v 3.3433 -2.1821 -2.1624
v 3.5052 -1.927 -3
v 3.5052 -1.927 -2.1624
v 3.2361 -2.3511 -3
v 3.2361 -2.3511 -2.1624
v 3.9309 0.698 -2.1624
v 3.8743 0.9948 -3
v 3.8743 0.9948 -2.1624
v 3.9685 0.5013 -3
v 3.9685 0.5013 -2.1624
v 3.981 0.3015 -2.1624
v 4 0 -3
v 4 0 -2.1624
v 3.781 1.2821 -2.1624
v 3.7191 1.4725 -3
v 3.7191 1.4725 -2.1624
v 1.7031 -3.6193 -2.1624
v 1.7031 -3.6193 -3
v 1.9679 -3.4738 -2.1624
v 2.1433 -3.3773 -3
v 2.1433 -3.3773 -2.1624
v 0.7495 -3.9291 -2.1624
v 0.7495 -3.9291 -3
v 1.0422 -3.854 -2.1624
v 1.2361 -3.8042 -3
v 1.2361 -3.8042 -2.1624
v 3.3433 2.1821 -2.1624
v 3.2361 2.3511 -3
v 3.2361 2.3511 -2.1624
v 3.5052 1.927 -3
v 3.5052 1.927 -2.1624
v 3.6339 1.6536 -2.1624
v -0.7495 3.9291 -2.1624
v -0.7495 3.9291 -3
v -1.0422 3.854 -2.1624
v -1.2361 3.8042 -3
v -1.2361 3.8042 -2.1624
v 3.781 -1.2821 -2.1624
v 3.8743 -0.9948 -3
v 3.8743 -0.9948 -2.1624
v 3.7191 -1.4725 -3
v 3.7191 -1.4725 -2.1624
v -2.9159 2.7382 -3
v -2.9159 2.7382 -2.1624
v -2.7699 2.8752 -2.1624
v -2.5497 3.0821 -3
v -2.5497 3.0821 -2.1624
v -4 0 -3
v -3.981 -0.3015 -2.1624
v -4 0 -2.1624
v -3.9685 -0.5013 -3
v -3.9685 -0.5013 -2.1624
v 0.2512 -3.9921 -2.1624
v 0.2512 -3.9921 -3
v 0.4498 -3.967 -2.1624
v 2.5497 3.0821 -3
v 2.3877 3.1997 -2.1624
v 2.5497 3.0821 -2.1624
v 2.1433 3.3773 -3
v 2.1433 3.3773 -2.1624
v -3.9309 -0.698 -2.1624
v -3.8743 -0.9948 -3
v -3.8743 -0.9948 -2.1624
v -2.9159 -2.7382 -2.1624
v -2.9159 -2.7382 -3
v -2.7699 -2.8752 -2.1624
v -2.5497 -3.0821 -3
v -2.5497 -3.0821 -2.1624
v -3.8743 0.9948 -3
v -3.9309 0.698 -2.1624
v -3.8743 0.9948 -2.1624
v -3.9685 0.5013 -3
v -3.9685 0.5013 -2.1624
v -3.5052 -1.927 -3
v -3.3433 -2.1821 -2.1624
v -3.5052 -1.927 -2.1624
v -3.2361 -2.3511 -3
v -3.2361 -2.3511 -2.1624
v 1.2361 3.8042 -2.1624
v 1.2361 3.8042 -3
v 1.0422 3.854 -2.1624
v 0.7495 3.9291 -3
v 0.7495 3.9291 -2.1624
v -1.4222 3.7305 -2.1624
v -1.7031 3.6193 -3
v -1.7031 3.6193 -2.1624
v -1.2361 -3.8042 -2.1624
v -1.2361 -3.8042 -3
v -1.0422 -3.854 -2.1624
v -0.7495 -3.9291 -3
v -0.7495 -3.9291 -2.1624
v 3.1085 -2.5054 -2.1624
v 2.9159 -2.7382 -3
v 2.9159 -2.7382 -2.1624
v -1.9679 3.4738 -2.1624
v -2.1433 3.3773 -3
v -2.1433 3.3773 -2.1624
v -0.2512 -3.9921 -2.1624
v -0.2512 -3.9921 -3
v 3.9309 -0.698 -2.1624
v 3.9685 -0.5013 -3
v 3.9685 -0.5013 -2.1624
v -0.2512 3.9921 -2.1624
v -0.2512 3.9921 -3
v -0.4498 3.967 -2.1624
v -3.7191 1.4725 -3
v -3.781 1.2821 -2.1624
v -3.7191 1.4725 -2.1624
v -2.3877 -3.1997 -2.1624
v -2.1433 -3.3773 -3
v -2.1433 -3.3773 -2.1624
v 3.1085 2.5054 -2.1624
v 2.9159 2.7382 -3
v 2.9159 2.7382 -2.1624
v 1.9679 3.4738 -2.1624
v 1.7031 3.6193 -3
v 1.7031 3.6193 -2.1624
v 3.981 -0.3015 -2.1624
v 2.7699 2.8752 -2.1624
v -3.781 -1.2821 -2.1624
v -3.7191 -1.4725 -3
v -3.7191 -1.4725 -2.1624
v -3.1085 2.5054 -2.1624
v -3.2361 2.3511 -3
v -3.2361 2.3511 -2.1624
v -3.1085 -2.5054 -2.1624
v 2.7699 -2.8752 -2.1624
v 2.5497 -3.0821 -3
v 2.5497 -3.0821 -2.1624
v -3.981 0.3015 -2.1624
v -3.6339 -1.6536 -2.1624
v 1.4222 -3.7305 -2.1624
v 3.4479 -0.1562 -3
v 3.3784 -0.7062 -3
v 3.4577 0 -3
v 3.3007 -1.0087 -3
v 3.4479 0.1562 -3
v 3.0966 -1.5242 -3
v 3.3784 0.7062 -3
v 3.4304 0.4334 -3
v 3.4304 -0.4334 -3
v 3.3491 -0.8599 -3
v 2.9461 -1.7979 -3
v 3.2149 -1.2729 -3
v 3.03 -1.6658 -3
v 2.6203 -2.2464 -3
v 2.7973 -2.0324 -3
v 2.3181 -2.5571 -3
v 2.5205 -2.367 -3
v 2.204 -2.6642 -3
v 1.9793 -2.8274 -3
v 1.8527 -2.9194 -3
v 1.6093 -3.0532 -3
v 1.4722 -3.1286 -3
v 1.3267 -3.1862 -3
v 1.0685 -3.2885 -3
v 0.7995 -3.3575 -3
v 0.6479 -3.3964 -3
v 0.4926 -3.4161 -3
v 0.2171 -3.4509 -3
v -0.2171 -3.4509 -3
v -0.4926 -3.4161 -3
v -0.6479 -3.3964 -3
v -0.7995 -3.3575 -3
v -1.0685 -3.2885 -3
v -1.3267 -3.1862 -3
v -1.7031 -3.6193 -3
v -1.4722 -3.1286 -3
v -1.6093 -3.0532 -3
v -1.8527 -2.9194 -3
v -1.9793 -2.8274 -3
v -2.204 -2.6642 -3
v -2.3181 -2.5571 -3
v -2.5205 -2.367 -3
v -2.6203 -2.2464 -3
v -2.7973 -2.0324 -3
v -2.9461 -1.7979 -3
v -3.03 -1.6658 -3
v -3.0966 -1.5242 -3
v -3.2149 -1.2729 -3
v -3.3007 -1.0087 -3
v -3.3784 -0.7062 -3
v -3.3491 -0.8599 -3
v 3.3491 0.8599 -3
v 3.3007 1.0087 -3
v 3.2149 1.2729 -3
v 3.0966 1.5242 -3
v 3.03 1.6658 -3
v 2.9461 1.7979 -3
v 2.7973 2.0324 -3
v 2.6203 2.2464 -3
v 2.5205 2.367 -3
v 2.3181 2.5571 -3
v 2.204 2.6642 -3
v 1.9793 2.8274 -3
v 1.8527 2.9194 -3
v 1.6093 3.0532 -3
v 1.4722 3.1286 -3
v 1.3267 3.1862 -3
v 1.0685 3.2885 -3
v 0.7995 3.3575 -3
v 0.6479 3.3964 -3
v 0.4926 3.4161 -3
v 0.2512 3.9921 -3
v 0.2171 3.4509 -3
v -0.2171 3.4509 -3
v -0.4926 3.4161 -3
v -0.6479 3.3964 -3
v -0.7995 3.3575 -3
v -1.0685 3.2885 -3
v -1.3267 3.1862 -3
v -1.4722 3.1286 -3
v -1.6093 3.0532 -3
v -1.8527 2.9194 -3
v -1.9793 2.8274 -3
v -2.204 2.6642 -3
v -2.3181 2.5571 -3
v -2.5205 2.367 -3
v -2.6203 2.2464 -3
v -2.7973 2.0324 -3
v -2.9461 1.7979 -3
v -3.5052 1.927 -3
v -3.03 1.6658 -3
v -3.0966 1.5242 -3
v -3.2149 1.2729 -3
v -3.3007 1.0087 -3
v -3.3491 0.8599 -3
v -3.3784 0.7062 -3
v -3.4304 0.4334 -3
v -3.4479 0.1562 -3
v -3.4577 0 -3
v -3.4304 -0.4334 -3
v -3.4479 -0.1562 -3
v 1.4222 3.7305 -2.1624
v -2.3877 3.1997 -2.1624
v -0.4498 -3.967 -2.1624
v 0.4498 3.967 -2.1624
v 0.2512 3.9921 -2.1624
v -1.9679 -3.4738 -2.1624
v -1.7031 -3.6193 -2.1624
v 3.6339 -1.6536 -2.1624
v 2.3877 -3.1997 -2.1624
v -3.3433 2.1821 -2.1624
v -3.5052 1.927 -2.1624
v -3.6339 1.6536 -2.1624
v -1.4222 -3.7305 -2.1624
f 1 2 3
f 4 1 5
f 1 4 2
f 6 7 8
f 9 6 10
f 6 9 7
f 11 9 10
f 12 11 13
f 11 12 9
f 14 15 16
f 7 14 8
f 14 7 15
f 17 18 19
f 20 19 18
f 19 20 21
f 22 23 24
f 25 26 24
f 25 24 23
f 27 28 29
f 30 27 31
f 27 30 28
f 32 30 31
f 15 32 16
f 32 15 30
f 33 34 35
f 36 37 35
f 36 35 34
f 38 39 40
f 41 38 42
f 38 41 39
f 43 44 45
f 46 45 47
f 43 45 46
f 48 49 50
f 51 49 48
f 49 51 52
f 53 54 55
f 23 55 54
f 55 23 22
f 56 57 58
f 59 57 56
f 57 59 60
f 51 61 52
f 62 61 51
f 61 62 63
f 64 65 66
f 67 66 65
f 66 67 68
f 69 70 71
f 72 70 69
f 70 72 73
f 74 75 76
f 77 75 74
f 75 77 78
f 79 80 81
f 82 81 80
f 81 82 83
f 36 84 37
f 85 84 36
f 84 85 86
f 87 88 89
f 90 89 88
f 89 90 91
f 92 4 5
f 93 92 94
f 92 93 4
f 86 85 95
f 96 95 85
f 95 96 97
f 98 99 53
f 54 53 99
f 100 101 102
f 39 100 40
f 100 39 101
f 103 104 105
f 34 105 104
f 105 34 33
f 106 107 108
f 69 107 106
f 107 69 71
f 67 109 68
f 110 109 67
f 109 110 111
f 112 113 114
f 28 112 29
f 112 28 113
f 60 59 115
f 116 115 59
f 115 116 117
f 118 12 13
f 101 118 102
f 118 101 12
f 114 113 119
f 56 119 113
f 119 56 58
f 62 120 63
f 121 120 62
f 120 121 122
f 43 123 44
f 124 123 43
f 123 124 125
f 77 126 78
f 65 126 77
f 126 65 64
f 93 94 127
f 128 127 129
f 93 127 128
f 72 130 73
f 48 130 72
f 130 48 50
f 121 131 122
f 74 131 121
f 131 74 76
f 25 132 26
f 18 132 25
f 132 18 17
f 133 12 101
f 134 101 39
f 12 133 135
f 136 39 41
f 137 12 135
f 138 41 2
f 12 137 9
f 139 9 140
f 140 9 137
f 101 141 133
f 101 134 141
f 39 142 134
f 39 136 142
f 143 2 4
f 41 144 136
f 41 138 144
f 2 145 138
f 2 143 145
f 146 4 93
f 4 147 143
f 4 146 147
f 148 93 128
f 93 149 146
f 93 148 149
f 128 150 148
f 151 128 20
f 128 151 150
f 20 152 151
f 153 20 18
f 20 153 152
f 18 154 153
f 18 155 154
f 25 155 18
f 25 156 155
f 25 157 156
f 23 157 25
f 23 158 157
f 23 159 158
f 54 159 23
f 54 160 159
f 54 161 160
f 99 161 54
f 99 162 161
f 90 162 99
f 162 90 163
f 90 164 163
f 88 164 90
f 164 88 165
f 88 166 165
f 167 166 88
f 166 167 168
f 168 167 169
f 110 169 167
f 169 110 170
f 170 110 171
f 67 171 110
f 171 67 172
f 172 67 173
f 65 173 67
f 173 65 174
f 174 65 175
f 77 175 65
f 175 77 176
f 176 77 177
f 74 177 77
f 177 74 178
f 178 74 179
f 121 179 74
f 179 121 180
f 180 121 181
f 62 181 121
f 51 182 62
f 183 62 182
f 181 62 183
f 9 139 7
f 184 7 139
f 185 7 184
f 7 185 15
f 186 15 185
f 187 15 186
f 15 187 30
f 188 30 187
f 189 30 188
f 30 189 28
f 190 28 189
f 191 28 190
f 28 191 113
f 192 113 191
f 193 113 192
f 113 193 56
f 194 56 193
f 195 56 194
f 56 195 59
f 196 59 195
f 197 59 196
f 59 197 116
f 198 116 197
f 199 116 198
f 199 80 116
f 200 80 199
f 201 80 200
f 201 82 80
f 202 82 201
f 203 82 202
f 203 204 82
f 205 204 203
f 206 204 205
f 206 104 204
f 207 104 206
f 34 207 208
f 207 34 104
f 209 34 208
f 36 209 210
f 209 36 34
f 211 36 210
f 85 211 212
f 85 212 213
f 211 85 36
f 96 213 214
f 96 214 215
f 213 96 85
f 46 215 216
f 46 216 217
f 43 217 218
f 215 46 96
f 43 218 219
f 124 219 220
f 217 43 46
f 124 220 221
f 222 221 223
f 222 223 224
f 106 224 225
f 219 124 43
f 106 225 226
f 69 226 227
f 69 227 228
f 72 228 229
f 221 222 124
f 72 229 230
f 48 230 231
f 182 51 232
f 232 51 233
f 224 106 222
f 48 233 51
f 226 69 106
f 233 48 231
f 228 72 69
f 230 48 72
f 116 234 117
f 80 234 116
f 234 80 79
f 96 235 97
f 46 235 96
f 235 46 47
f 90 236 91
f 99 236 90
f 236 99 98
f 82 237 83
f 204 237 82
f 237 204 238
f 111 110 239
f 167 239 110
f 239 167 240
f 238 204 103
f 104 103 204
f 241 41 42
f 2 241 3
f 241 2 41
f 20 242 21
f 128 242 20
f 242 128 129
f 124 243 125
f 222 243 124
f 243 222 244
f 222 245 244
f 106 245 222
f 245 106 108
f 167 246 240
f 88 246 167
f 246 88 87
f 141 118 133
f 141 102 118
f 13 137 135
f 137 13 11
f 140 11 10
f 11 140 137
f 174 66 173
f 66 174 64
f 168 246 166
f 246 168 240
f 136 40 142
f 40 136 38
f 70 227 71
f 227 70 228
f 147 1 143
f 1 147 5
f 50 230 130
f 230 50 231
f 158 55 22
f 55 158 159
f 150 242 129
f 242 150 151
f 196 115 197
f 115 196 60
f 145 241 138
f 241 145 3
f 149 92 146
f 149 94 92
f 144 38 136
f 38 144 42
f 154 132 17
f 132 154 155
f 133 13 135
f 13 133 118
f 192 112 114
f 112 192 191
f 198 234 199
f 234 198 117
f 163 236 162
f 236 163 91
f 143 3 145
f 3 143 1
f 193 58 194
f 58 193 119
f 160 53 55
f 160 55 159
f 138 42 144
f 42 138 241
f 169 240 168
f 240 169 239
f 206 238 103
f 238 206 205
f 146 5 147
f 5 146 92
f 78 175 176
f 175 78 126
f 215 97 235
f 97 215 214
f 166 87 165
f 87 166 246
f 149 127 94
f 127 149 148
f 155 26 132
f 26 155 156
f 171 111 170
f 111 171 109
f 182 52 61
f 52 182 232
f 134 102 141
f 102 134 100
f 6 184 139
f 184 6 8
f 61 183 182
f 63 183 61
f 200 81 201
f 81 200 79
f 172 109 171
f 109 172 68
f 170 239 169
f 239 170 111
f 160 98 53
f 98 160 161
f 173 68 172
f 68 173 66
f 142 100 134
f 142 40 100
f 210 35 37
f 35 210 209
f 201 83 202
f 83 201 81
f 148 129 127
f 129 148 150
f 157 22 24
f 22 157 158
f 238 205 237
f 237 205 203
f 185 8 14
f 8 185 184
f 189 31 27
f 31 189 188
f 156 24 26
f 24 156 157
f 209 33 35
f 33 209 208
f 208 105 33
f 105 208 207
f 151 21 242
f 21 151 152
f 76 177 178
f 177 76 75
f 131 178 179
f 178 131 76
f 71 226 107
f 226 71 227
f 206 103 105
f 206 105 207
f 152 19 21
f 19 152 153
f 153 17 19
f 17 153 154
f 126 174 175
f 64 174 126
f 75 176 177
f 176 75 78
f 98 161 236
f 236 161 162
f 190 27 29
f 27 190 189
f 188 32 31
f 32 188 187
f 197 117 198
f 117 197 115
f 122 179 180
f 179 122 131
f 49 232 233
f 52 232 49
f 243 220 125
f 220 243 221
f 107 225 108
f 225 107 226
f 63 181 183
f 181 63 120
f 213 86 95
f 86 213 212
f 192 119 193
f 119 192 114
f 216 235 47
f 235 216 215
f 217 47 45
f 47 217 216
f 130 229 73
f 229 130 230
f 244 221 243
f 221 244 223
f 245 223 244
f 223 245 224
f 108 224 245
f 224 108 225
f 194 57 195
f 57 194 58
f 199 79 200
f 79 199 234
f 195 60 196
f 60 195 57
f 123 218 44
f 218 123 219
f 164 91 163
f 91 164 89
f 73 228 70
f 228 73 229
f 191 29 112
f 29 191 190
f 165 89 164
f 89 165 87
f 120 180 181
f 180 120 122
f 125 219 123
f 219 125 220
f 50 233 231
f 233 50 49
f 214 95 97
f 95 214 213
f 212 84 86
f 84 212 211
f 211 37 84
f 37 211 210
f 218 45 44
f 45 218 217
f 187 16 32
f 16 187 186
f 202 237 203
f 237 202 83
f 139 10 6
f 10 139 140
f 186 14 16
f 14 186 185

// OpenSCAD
$fn = 50;

difference() {
	union() {
		translate(v = [0, 0, -3.0]) {
			cylinder(h = 6, r = 4.0);
		}
		#translate(v = [0, 0, -6.0]) {
			cylinder(h = 6, r = 2.875);
		}
	}
	union() {
		translate(v = [0, 0, 0]) {
			rotate(a = [0, 0, 0]) {
				difference() {
					union() {
						translate(v = [0, 0, -6.0]) {
							cylinder(h = 6, r = 2.6);
						}
						translate(v = [0, 0, -3.9]) {
							cylinder(h = 3.9, r1 = 2.875, r2 = 5.4);
						}
						translate(v = [0, 0, -6.0]) {
							cylinder(h = 6, r = 2.875);
						}
						translate(v = [0, 0, -6.0]) {
							cylinder(h = 6, r = 2.6);
						}
					}
					union();
				}
			}
		}
		#cylinder(h = 3, r = 5.0);
	}
}
